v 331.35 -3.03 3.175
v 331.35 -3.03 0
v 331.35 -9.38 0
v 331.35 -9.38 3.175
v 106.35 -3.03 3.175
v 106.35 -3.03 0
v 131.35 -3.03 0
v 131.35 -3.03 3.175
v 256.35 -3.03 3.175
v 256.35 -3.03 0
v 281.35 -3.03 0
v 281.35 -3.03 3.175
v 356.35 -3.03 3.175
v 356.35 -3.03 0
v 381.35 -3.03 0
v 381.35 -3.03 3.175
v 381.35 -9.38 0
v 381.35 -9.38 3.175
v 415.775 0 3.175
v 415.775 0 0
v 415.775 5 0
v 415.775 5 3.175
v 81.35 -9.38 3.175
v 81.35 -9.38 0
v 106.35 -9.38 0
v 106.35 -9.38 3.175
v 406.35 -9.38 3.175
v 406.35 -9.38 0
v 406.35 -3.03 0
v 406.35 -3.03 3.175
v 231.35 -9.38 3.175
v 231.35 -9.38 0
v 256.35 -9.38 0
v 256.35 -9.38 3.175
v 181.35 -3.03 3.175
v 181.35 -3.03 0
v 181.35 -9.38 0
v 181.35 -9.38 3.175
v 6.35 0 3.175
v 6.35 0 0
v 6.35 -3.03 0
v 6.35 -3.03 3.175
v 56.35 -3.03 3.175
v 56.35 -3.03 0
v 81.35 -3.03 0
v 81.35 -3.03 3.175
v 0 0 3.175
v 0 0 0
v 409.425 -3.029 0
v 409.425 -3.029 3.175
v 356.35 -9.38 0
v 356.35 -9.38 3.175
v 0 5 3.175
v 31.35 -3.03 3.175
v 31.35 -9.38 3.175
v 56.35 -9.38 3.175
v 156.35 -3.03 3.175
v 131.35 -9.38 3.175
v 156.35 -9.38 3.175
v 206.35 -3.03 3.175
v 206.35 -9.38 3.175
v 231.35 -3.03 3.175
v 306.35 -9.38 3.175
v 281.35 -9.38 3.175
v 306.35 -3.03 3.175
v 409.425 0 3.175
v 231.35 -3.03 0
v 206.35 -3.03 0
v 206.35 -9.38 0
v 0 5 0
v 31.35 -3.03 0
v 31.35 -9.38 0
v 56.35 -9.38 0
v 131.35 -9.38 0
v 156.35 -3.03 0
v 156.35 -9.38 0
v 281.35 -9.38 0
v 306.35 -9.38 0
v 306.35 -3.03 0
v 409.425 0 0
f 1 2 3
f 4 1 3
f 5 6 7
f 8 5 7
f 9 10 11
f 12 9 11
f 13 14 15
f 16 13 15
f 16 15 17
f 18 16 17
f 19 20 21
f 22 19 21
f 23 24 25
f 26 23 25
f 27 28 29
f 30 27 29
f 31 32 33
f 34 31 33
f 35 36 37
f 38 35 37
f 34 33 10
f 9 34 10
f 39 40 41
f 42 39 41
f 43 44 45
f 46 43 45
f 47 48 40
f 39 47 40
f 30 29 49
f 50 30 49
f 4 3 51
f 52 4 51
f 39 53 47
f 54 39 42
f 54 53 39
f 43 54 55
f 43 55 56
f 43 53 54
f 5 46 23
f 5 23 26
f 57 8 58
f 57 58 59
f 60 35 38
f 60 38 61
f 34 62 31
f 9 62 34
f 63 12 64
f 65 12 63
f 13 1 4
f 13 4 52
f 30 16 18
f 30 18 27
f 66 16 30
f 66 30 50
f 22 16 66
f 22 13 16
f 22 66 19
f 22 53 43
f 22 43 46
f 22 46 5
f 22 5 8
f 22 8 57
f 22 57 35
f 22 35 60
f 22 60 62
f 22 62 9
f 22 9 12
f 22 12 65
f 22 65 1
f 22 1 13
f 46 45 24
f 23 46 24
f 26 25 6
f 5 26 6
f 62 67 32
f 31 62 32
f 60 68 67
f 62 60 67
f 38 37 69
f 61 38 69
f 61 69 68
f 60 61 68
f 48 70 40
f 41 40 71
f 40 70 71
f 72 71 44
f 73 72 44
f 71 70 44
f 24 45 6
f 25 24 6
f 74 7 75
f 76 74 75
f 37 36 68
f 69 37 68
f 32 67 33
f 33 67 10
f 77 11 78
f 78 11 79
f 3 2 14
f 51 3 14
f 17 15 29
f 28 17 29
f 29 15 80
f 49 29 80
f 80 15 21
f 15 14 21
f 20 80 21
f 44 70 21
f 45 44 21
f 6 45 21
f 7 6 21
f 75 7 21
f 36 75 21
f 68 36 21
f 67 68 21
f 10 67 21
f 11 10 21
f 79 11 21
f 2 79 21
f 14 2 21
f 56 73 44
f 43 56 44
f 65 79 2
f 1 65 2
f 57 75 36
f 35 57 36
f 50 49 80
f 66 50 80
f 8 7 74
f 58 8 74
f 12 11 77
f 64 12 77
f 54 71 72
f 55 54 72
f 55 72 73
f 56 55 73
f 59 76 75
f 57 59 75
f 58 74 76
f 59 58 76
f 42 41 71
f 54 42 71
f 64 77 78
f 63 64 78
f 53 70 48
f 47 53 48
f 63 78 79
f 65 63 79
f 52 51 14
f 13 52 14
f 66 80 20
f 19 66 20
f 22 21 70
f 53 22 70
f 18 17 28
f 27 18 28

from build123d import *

# Parameters (mm, degrees)
BOSS_EXTRUDE1_DEPTH = 3.175


with BuildPart() as part:
    # Sketch1 → Boss-Extrude1 (new body)
    with BuildSketch(Plane.XY):
        Polygon((0, 0), (6.35, 0), (6.35, -3.03), (31.35, -3.03), (31.35, -9.38), (56.35, -9.38), (56.35, -3.03), (81.35, -3.03), (81.35, -9.38), (106.35, -9.38), (106.35, -3.03), (131.35, -3.03), (131.35, -9.38), (156.35, -9.38), (156.35, -3.03), (181.35, -3.03), (181.35, -9.38), (206.35, -9.38), (206.35, -3.03), (231.35, -3.03), (231.35, -9.38), (256.35, -9.38), (256.35, -3.03), (281.35, -3.03), (281.35, -9.38), (306.35, -9.38), (306.35, -3.03), (331.35, -3.03), (331.35, -9.38), (356.35, -9.38), (356.35, -3.03), (381.35, -3.03), (381.35, -9.38), (406.35, -9.38), (406.35, -3.03), (409.425, -3.028710343), (409.425, 2.97e-07), (415.775, 2.97e-07), (415.775, 5), (409.42, 5), (0, 5), align=None)
    extrude(amount=BOSS_EXTRUDE1_DEPTH)


solid = part.part
